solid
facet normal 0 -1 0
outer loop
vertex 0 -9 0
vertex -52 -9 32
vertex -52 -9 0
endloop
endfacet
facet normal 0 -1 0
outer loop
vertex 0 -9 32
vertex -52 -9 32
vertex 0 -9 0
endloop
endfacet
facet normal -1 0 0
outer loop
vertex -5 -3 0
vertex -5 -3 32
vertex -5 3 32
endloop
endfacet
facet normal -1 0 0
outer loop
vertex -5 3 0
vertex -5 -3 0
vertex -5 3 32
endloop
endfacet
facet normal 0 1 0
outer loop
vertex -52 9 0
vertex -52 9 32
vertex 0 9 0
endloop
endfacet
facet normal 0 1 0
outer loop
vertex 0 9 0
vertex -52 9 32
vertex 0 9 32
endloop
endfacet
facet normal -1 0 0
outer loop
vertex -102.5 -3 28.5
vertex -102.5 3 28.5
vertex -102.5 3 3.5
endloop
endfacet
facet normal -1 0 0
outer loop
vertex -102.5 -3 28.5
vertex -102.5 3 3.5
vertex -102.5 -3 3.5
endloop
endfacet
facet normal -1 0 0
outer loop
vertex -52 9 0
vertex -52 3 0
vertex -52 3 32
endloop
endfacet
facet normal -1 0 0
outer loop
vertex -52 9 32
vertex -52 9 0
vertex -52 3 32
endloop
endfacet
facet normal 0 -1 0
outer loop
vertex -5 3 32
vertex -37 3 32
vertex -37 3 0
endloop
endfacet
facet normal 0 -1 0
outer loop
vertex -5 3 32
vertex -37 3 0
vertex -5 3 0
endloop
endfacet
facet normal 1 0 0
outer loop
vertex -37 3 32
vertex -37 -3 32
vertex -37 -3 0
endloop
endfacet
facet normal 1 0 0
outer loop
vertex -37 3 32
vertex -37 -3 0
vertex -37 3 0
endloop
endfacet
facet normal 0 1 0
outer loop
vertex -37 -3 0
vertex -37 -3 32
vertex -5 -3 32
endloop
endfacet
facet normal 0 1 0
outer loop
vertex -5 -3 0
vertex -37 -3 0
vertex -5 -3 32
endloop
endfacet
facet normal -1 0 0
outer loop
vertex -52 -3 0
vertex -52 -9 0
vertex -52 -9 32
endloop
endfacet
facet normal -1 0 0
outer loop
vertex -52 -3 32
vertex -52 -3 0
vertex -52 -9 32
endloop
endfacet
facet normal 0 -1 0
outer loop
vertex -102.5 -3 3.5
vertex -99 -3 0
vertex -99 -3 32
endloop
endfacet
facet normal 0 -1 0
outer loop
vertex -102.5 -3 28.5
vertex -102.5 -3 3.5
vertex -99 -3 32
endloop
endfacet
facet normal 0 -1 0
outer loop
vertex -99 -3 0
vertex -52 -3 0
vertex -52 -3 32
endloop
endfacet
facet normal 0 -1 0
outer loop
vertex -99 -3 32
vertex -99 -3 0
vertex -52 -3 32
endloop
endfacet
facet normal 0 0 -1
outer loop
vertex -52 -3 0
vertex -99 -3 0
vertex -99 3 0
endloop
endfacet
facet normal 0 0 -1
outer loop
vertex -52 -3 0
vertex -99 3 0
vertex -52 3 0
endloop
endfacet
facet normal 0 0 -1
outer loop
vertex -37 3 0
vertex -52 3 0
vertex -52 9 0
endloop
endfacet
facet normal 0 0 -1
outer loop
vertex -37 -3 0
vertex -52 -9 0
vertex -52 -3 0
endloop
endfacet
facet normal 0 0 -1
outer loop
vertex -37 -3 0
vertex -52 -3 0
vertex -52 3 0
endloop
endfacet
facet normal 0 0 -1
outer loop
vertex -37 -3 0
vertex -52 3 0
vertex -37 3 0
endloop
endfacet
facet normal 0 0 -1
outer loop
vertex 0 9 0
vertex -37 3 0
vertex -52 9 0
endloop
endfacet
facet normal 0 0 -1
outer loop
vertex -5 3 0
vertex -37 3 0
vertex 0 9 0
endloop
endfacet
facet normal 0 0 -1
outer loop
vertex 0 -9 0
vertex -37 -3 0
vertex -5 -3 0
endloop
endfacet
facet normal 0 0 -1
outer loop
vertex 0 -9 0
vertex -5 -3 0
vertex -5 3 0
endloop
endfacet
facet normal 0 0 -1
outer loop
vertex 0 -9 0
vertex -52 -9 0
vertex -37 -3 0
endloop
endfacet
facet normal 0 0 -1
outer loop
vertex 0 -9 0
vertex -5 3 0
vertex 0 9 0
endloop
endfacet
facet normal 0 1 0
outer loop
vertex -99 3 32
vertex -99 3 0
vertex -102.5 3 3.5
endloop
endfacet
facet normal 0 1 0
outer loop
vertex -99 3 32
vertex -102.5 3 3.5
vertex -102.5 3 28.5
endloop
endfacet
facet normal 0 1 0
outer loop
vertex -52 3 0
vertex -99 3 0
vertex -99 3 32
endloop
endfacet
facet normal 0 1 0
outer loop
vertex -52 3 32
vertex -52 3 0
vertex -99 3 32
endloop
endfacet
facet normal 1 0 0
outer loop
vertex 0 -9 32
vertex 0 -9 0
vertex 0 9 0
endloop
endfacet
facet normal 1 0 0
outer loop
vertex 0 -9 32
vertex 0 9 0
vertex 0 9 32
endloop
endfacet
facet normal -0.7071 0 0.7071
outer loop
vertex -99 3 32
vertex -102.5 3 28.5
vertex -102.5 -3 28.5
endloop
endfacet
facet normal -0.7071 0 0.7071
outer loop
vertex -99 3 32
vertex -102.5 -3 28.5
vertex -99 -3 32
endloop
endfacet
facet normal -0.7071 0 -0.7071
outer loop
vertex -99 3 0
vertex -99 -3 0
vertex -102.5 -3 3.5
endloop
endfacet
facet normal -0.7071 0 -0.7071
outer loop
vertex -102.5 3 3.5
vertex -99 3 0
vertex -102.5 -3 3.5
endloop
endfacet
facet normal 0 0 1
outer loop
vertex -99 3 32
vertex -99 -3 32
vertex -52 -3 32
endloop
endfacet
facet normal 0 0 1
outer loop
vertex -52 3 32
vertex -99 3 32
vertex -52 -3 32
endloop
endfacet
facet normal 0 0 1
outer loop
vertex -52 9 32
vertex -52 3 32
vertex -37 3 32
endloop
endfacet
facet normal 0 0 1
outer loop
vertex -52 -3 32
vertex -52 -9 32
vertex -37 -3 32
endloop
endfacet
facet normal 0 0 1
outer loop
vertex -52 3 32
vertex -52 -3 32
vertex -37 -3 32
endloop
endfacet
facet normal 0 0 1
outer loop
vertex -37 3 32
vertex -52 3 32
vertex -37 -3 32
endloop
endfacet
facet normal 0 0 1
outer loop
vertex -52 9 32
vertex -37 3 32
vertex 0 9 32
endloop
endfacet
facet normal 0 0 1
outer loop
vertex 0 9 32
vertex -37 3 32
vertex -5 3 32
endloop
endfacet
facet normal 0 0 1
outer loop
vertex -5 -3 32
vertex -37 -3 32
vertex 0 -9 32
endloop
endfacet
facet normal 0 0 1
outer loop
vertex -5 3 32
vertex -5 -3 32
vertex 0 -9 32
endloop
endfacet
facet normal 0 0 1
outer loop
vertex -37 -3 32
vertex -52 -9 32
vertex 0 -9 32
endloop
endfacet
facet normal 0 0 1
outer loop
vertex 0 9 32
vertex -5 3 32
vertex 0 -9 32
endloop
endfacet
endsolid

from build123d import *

# Parameters (mm, degrees)
F0_W     = 52
F0_H     = 32
F1_DEPTH = 9
F2_W     = 32
F2_H     = 6
F3_DEPTH = 32.001
F4_W     = 6
F4_H     = 32
F5_DEPTH = 50.5
F7_DEPTH = 12.001


with BuildPart() as f1:
    # F0 (on Front) → F1 (new body, symmetric)
    with BuildSketch(Plane.XZ):
        with Locations((-26, 16)):
            Rectangle(F0_W, F0_H)
    extrude(amount=F1_DEPTH, both=True)

    # F2 (on face) → F3 (cut, through all)
    with BuildSketch(Plane.XY.offset(32)):
        with Locations((-21, 0)):
            Rectangle(F2_W, F2_H)
    extrude(amount=-F3_DEPTH, mode=Mode.SUBTRACT)

    # F4 (on face) → F5 (join)
    with BuildSketch(Plane(origin=(-52, 0, 0), x_dir=(0, -1, 0), z_dir=(-1, 0, 0))):
        with Locations((0, 16)):
            Rectangle(F4_W, F4_H)
    extrude(amount=F5_DEPTH)

    # F6 (on face) → F7 (cut, through all)
    with BuildSketch(Plane.XZ.offset(3)):
        Polygon((-102.5, 28.5), (-99, 32), (-102.5, 32), align=None)
        Polygon((-102.5, 0), (-99, 0), (-102.5, 3.5), align=None)
    extrude(amount=-F7_DEPTH, mode=Mode.SUBTRACT)


solid = f1.part
